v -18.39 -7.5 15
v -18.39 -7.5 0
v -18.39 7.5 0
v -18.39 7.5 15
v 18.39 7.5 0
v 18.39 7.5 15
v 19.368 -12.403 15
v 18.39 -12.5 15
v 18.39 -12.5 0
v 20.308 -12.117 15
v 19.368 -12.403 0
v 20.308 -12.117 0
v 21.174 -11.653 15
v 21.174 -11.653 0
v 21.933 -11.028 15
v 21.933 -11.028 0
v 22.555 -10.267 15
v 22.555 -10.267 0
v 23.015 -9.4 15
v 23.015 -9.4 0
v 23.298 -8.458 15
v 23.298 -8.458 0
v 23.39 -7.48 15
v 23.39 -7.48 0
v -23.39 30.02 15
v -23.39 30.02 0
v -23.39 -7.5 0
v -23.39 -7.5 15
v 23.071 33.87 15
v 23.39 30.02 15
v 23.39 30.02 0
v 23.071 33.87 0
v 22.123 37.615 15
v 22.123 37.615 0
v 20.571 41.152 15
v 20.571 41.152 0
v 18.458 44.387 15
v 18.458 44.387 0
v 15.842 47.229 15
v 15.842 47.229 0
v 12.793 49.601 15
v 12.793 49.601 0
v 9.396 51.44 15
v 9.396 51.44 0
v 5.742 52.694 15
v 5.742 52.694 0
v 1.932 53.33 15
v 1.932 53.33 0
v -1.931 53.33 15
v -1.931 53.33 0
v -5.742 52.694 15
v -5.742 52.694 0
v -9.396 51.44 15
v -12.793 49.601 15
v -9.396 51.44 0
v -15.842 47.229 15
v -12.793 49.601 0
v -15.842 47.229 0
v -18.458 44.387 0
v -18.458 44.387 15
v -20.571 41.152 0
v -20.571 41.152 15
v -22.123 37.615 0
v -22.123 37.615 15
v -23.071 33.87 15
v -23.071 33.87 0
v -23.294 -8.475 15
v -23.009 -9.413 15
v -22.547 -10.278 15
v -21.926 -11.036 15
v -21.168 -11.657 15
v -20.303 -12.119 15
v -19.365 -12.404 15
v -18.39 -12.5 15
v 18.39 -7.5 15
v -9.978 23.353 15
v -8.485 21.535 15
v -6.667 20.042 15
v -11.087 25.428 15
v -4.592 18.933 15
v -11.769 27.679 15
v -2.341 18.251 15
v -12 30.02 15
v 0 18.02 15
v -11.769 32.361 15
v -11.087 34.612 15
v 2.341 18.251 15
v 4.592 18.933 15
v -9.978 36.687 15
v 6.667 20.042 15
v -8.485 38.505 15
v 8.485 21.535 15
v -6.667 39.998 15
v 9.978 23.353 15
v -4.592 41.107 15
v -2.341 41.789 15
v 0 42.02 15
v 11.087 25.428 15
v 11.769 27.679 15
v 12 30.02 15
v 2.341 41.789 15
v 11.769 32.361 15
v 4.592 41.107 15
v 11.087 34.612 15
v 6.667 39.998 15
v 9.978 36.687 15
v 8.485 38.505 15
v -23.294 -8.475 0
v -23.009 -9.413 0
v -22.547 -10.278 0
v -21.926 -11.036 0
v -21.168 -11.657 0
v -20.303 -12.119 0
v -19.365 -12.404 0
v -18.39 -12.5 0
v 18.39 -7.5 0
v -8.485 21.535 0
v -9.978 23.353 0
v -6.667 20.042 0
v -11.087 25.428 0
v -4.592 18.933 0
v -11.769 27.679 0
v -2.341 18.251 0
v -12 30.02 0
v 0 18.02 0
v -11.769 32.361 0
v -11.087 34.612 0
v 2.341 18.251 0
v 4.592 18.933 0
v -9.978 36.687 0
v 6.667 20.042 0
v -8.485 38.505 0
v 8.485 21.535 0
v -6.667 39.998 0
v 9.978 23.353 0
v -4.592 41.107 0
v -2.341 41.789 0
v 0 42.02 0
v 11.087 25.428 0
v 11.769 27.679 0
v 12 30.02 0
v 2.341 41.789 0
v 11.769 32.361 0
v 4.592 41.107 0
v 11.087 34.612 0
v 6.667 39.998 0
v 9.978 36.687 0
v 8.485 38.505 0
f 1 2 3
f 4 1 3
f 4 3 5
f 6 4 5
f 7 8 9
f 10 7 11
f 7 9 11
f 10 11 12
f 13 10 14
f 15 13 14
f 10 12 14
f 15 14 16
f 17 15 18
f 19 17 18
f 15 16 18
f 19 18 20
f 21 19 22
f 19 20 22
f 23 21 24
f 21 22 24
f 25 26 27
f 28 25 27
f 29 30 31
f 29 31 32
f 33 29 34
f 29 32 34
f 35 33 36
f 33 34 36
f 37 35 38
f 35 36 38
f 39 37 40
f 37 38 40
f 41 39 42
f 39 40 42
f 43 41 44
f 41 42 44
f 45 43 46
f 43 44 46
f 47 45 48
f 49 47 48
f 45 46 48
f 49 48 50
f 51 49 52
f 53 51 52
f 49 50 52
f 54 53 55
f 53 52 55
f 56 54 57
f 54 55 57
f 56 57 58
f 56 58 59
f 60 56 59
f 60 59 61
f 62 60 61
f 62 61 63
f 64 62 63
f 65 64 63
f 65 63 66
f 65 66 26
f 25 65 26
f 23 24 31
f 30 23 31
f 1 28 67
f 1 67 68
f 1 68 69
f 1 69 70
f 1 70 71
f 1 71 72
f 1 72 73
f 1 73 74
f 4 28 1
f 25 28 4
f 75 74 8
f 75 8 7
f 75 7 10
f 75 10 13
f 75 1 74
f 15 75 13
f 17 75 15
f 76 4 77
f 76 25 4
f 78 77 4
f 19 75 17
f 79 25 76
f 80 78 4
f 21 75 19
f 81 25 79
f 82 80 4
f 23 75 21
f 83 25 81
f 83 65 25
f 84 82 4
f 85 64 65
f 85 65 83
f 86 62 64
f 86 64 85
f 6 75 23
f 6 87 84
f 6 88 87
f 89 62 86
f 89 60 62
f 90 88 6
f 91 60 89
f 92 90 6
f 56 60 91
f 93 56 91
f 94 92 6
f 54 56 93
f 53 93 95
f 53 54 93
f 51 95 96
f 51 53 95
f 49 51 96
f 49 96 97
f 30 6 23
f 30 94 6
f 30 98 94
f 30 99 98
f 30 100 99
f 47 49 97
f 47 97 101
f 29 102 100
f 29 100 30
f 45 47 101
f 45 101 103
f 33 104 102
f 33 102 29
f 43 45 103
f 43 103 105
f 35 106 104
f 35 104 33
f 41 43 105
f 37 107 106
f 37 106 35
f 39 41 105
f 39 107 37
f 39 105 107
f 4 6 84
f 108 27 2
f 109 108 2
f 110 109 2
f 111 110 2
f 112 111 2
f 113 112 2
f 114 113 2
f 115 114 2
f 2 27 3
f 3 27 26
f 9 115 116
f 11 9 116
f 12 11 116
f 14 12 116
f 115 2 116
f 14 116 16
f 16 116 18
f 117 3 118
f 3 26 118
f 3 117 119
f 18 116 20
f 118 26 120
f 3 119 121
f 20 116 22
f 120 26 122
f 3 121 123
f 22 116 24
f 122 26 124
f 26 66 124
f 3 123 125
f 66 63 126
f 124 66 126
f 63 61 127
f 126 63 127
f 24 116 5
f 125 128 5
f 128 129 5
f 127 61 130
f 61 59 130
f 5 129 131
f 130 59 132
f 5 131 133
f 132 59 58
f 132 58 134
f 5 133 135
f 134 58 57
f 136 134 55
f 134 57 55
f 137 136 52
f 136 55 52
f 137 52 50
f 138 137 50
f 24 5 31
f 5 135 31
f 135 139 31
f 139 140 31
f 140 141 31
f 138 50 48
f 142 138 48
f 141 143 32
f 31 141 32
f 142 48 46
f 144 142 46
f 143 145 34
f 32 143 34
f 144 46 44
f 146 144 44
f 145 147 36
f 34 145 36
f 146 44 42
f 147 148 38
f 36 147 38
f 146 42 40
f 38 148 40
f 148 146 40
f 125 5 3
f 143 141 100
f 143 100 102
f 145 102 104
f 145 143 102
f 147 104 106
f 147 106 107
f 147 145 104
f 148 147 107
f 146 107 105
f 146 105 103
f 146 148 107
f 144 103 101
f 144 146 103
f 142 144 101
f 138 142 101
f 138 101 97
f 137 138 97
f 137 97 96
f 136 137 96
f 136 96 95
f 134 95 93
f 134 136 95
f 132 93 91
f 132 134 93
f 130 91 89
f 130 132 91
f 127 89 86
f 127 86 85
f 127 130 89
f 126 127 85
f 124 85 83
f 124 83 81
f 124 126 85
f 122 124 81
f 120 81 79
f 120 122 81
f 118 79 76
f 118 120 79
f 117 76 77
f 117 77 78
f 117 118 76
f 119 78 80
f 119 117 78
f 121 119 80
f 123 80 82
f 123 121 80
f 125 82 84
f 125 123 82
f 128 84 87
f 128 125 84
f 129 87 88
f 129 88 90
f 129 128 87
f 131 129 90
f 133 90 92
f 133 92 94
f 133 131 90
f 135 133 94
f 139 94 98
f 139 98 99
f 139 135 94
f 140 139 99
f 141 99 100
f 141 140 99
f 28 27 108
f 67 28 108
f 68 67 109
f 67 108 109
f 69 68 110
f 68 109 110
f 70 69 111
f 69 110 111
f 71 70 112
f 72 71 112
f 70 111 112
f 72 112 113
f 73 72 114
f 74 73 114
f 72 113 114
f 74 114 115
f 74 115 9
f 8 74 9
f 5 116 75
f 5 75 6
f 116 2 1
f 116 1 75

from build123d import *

# Parameters (mm, degrees)
SKETCH1_R           = 12
SKETCH1_W           = 36.78
SKETCH1_H           = 15
BOSS_EXTRUDE1_DEPTH = 15


with BuildPart() as part:
    # Sketch1 → Boss-Extrude1 (new body)
    with BuildSketch(Plane.XY):
        with BuildLine():
            Line((-18.39, -12.5), (18.390366936, -12.5))
            ThreePointArc((18.390366936, -12.5), (21.932962966, -11.028457647), (23.390326957, -7.480005346))
            Line((23.390326957, -7.480005346), (23.390326957, 30.02))
            ThreePointArc((23.390326957, 30.02), (0.000163479, 53.410163479), (-23.39, 30.02))
            Line((-23.39, 30.02), (-23.39, -7.5))
            ThreePointArc((-23.39, -7.5), (-21.925533906, -11.035533906), (-18.39, -12.5))
        make_face()
        with Locations((0, 30.02)):
            Circle(SKETCH1_R, mode=Mode.SUBTRACT)
        Rectangle(SKETCH1_W, SKETCH1_H, mode=Mode.SUBTRACT)
    extrude(amount=BOSS_EXTRUDE1_DEPTH)


solid = part.part
